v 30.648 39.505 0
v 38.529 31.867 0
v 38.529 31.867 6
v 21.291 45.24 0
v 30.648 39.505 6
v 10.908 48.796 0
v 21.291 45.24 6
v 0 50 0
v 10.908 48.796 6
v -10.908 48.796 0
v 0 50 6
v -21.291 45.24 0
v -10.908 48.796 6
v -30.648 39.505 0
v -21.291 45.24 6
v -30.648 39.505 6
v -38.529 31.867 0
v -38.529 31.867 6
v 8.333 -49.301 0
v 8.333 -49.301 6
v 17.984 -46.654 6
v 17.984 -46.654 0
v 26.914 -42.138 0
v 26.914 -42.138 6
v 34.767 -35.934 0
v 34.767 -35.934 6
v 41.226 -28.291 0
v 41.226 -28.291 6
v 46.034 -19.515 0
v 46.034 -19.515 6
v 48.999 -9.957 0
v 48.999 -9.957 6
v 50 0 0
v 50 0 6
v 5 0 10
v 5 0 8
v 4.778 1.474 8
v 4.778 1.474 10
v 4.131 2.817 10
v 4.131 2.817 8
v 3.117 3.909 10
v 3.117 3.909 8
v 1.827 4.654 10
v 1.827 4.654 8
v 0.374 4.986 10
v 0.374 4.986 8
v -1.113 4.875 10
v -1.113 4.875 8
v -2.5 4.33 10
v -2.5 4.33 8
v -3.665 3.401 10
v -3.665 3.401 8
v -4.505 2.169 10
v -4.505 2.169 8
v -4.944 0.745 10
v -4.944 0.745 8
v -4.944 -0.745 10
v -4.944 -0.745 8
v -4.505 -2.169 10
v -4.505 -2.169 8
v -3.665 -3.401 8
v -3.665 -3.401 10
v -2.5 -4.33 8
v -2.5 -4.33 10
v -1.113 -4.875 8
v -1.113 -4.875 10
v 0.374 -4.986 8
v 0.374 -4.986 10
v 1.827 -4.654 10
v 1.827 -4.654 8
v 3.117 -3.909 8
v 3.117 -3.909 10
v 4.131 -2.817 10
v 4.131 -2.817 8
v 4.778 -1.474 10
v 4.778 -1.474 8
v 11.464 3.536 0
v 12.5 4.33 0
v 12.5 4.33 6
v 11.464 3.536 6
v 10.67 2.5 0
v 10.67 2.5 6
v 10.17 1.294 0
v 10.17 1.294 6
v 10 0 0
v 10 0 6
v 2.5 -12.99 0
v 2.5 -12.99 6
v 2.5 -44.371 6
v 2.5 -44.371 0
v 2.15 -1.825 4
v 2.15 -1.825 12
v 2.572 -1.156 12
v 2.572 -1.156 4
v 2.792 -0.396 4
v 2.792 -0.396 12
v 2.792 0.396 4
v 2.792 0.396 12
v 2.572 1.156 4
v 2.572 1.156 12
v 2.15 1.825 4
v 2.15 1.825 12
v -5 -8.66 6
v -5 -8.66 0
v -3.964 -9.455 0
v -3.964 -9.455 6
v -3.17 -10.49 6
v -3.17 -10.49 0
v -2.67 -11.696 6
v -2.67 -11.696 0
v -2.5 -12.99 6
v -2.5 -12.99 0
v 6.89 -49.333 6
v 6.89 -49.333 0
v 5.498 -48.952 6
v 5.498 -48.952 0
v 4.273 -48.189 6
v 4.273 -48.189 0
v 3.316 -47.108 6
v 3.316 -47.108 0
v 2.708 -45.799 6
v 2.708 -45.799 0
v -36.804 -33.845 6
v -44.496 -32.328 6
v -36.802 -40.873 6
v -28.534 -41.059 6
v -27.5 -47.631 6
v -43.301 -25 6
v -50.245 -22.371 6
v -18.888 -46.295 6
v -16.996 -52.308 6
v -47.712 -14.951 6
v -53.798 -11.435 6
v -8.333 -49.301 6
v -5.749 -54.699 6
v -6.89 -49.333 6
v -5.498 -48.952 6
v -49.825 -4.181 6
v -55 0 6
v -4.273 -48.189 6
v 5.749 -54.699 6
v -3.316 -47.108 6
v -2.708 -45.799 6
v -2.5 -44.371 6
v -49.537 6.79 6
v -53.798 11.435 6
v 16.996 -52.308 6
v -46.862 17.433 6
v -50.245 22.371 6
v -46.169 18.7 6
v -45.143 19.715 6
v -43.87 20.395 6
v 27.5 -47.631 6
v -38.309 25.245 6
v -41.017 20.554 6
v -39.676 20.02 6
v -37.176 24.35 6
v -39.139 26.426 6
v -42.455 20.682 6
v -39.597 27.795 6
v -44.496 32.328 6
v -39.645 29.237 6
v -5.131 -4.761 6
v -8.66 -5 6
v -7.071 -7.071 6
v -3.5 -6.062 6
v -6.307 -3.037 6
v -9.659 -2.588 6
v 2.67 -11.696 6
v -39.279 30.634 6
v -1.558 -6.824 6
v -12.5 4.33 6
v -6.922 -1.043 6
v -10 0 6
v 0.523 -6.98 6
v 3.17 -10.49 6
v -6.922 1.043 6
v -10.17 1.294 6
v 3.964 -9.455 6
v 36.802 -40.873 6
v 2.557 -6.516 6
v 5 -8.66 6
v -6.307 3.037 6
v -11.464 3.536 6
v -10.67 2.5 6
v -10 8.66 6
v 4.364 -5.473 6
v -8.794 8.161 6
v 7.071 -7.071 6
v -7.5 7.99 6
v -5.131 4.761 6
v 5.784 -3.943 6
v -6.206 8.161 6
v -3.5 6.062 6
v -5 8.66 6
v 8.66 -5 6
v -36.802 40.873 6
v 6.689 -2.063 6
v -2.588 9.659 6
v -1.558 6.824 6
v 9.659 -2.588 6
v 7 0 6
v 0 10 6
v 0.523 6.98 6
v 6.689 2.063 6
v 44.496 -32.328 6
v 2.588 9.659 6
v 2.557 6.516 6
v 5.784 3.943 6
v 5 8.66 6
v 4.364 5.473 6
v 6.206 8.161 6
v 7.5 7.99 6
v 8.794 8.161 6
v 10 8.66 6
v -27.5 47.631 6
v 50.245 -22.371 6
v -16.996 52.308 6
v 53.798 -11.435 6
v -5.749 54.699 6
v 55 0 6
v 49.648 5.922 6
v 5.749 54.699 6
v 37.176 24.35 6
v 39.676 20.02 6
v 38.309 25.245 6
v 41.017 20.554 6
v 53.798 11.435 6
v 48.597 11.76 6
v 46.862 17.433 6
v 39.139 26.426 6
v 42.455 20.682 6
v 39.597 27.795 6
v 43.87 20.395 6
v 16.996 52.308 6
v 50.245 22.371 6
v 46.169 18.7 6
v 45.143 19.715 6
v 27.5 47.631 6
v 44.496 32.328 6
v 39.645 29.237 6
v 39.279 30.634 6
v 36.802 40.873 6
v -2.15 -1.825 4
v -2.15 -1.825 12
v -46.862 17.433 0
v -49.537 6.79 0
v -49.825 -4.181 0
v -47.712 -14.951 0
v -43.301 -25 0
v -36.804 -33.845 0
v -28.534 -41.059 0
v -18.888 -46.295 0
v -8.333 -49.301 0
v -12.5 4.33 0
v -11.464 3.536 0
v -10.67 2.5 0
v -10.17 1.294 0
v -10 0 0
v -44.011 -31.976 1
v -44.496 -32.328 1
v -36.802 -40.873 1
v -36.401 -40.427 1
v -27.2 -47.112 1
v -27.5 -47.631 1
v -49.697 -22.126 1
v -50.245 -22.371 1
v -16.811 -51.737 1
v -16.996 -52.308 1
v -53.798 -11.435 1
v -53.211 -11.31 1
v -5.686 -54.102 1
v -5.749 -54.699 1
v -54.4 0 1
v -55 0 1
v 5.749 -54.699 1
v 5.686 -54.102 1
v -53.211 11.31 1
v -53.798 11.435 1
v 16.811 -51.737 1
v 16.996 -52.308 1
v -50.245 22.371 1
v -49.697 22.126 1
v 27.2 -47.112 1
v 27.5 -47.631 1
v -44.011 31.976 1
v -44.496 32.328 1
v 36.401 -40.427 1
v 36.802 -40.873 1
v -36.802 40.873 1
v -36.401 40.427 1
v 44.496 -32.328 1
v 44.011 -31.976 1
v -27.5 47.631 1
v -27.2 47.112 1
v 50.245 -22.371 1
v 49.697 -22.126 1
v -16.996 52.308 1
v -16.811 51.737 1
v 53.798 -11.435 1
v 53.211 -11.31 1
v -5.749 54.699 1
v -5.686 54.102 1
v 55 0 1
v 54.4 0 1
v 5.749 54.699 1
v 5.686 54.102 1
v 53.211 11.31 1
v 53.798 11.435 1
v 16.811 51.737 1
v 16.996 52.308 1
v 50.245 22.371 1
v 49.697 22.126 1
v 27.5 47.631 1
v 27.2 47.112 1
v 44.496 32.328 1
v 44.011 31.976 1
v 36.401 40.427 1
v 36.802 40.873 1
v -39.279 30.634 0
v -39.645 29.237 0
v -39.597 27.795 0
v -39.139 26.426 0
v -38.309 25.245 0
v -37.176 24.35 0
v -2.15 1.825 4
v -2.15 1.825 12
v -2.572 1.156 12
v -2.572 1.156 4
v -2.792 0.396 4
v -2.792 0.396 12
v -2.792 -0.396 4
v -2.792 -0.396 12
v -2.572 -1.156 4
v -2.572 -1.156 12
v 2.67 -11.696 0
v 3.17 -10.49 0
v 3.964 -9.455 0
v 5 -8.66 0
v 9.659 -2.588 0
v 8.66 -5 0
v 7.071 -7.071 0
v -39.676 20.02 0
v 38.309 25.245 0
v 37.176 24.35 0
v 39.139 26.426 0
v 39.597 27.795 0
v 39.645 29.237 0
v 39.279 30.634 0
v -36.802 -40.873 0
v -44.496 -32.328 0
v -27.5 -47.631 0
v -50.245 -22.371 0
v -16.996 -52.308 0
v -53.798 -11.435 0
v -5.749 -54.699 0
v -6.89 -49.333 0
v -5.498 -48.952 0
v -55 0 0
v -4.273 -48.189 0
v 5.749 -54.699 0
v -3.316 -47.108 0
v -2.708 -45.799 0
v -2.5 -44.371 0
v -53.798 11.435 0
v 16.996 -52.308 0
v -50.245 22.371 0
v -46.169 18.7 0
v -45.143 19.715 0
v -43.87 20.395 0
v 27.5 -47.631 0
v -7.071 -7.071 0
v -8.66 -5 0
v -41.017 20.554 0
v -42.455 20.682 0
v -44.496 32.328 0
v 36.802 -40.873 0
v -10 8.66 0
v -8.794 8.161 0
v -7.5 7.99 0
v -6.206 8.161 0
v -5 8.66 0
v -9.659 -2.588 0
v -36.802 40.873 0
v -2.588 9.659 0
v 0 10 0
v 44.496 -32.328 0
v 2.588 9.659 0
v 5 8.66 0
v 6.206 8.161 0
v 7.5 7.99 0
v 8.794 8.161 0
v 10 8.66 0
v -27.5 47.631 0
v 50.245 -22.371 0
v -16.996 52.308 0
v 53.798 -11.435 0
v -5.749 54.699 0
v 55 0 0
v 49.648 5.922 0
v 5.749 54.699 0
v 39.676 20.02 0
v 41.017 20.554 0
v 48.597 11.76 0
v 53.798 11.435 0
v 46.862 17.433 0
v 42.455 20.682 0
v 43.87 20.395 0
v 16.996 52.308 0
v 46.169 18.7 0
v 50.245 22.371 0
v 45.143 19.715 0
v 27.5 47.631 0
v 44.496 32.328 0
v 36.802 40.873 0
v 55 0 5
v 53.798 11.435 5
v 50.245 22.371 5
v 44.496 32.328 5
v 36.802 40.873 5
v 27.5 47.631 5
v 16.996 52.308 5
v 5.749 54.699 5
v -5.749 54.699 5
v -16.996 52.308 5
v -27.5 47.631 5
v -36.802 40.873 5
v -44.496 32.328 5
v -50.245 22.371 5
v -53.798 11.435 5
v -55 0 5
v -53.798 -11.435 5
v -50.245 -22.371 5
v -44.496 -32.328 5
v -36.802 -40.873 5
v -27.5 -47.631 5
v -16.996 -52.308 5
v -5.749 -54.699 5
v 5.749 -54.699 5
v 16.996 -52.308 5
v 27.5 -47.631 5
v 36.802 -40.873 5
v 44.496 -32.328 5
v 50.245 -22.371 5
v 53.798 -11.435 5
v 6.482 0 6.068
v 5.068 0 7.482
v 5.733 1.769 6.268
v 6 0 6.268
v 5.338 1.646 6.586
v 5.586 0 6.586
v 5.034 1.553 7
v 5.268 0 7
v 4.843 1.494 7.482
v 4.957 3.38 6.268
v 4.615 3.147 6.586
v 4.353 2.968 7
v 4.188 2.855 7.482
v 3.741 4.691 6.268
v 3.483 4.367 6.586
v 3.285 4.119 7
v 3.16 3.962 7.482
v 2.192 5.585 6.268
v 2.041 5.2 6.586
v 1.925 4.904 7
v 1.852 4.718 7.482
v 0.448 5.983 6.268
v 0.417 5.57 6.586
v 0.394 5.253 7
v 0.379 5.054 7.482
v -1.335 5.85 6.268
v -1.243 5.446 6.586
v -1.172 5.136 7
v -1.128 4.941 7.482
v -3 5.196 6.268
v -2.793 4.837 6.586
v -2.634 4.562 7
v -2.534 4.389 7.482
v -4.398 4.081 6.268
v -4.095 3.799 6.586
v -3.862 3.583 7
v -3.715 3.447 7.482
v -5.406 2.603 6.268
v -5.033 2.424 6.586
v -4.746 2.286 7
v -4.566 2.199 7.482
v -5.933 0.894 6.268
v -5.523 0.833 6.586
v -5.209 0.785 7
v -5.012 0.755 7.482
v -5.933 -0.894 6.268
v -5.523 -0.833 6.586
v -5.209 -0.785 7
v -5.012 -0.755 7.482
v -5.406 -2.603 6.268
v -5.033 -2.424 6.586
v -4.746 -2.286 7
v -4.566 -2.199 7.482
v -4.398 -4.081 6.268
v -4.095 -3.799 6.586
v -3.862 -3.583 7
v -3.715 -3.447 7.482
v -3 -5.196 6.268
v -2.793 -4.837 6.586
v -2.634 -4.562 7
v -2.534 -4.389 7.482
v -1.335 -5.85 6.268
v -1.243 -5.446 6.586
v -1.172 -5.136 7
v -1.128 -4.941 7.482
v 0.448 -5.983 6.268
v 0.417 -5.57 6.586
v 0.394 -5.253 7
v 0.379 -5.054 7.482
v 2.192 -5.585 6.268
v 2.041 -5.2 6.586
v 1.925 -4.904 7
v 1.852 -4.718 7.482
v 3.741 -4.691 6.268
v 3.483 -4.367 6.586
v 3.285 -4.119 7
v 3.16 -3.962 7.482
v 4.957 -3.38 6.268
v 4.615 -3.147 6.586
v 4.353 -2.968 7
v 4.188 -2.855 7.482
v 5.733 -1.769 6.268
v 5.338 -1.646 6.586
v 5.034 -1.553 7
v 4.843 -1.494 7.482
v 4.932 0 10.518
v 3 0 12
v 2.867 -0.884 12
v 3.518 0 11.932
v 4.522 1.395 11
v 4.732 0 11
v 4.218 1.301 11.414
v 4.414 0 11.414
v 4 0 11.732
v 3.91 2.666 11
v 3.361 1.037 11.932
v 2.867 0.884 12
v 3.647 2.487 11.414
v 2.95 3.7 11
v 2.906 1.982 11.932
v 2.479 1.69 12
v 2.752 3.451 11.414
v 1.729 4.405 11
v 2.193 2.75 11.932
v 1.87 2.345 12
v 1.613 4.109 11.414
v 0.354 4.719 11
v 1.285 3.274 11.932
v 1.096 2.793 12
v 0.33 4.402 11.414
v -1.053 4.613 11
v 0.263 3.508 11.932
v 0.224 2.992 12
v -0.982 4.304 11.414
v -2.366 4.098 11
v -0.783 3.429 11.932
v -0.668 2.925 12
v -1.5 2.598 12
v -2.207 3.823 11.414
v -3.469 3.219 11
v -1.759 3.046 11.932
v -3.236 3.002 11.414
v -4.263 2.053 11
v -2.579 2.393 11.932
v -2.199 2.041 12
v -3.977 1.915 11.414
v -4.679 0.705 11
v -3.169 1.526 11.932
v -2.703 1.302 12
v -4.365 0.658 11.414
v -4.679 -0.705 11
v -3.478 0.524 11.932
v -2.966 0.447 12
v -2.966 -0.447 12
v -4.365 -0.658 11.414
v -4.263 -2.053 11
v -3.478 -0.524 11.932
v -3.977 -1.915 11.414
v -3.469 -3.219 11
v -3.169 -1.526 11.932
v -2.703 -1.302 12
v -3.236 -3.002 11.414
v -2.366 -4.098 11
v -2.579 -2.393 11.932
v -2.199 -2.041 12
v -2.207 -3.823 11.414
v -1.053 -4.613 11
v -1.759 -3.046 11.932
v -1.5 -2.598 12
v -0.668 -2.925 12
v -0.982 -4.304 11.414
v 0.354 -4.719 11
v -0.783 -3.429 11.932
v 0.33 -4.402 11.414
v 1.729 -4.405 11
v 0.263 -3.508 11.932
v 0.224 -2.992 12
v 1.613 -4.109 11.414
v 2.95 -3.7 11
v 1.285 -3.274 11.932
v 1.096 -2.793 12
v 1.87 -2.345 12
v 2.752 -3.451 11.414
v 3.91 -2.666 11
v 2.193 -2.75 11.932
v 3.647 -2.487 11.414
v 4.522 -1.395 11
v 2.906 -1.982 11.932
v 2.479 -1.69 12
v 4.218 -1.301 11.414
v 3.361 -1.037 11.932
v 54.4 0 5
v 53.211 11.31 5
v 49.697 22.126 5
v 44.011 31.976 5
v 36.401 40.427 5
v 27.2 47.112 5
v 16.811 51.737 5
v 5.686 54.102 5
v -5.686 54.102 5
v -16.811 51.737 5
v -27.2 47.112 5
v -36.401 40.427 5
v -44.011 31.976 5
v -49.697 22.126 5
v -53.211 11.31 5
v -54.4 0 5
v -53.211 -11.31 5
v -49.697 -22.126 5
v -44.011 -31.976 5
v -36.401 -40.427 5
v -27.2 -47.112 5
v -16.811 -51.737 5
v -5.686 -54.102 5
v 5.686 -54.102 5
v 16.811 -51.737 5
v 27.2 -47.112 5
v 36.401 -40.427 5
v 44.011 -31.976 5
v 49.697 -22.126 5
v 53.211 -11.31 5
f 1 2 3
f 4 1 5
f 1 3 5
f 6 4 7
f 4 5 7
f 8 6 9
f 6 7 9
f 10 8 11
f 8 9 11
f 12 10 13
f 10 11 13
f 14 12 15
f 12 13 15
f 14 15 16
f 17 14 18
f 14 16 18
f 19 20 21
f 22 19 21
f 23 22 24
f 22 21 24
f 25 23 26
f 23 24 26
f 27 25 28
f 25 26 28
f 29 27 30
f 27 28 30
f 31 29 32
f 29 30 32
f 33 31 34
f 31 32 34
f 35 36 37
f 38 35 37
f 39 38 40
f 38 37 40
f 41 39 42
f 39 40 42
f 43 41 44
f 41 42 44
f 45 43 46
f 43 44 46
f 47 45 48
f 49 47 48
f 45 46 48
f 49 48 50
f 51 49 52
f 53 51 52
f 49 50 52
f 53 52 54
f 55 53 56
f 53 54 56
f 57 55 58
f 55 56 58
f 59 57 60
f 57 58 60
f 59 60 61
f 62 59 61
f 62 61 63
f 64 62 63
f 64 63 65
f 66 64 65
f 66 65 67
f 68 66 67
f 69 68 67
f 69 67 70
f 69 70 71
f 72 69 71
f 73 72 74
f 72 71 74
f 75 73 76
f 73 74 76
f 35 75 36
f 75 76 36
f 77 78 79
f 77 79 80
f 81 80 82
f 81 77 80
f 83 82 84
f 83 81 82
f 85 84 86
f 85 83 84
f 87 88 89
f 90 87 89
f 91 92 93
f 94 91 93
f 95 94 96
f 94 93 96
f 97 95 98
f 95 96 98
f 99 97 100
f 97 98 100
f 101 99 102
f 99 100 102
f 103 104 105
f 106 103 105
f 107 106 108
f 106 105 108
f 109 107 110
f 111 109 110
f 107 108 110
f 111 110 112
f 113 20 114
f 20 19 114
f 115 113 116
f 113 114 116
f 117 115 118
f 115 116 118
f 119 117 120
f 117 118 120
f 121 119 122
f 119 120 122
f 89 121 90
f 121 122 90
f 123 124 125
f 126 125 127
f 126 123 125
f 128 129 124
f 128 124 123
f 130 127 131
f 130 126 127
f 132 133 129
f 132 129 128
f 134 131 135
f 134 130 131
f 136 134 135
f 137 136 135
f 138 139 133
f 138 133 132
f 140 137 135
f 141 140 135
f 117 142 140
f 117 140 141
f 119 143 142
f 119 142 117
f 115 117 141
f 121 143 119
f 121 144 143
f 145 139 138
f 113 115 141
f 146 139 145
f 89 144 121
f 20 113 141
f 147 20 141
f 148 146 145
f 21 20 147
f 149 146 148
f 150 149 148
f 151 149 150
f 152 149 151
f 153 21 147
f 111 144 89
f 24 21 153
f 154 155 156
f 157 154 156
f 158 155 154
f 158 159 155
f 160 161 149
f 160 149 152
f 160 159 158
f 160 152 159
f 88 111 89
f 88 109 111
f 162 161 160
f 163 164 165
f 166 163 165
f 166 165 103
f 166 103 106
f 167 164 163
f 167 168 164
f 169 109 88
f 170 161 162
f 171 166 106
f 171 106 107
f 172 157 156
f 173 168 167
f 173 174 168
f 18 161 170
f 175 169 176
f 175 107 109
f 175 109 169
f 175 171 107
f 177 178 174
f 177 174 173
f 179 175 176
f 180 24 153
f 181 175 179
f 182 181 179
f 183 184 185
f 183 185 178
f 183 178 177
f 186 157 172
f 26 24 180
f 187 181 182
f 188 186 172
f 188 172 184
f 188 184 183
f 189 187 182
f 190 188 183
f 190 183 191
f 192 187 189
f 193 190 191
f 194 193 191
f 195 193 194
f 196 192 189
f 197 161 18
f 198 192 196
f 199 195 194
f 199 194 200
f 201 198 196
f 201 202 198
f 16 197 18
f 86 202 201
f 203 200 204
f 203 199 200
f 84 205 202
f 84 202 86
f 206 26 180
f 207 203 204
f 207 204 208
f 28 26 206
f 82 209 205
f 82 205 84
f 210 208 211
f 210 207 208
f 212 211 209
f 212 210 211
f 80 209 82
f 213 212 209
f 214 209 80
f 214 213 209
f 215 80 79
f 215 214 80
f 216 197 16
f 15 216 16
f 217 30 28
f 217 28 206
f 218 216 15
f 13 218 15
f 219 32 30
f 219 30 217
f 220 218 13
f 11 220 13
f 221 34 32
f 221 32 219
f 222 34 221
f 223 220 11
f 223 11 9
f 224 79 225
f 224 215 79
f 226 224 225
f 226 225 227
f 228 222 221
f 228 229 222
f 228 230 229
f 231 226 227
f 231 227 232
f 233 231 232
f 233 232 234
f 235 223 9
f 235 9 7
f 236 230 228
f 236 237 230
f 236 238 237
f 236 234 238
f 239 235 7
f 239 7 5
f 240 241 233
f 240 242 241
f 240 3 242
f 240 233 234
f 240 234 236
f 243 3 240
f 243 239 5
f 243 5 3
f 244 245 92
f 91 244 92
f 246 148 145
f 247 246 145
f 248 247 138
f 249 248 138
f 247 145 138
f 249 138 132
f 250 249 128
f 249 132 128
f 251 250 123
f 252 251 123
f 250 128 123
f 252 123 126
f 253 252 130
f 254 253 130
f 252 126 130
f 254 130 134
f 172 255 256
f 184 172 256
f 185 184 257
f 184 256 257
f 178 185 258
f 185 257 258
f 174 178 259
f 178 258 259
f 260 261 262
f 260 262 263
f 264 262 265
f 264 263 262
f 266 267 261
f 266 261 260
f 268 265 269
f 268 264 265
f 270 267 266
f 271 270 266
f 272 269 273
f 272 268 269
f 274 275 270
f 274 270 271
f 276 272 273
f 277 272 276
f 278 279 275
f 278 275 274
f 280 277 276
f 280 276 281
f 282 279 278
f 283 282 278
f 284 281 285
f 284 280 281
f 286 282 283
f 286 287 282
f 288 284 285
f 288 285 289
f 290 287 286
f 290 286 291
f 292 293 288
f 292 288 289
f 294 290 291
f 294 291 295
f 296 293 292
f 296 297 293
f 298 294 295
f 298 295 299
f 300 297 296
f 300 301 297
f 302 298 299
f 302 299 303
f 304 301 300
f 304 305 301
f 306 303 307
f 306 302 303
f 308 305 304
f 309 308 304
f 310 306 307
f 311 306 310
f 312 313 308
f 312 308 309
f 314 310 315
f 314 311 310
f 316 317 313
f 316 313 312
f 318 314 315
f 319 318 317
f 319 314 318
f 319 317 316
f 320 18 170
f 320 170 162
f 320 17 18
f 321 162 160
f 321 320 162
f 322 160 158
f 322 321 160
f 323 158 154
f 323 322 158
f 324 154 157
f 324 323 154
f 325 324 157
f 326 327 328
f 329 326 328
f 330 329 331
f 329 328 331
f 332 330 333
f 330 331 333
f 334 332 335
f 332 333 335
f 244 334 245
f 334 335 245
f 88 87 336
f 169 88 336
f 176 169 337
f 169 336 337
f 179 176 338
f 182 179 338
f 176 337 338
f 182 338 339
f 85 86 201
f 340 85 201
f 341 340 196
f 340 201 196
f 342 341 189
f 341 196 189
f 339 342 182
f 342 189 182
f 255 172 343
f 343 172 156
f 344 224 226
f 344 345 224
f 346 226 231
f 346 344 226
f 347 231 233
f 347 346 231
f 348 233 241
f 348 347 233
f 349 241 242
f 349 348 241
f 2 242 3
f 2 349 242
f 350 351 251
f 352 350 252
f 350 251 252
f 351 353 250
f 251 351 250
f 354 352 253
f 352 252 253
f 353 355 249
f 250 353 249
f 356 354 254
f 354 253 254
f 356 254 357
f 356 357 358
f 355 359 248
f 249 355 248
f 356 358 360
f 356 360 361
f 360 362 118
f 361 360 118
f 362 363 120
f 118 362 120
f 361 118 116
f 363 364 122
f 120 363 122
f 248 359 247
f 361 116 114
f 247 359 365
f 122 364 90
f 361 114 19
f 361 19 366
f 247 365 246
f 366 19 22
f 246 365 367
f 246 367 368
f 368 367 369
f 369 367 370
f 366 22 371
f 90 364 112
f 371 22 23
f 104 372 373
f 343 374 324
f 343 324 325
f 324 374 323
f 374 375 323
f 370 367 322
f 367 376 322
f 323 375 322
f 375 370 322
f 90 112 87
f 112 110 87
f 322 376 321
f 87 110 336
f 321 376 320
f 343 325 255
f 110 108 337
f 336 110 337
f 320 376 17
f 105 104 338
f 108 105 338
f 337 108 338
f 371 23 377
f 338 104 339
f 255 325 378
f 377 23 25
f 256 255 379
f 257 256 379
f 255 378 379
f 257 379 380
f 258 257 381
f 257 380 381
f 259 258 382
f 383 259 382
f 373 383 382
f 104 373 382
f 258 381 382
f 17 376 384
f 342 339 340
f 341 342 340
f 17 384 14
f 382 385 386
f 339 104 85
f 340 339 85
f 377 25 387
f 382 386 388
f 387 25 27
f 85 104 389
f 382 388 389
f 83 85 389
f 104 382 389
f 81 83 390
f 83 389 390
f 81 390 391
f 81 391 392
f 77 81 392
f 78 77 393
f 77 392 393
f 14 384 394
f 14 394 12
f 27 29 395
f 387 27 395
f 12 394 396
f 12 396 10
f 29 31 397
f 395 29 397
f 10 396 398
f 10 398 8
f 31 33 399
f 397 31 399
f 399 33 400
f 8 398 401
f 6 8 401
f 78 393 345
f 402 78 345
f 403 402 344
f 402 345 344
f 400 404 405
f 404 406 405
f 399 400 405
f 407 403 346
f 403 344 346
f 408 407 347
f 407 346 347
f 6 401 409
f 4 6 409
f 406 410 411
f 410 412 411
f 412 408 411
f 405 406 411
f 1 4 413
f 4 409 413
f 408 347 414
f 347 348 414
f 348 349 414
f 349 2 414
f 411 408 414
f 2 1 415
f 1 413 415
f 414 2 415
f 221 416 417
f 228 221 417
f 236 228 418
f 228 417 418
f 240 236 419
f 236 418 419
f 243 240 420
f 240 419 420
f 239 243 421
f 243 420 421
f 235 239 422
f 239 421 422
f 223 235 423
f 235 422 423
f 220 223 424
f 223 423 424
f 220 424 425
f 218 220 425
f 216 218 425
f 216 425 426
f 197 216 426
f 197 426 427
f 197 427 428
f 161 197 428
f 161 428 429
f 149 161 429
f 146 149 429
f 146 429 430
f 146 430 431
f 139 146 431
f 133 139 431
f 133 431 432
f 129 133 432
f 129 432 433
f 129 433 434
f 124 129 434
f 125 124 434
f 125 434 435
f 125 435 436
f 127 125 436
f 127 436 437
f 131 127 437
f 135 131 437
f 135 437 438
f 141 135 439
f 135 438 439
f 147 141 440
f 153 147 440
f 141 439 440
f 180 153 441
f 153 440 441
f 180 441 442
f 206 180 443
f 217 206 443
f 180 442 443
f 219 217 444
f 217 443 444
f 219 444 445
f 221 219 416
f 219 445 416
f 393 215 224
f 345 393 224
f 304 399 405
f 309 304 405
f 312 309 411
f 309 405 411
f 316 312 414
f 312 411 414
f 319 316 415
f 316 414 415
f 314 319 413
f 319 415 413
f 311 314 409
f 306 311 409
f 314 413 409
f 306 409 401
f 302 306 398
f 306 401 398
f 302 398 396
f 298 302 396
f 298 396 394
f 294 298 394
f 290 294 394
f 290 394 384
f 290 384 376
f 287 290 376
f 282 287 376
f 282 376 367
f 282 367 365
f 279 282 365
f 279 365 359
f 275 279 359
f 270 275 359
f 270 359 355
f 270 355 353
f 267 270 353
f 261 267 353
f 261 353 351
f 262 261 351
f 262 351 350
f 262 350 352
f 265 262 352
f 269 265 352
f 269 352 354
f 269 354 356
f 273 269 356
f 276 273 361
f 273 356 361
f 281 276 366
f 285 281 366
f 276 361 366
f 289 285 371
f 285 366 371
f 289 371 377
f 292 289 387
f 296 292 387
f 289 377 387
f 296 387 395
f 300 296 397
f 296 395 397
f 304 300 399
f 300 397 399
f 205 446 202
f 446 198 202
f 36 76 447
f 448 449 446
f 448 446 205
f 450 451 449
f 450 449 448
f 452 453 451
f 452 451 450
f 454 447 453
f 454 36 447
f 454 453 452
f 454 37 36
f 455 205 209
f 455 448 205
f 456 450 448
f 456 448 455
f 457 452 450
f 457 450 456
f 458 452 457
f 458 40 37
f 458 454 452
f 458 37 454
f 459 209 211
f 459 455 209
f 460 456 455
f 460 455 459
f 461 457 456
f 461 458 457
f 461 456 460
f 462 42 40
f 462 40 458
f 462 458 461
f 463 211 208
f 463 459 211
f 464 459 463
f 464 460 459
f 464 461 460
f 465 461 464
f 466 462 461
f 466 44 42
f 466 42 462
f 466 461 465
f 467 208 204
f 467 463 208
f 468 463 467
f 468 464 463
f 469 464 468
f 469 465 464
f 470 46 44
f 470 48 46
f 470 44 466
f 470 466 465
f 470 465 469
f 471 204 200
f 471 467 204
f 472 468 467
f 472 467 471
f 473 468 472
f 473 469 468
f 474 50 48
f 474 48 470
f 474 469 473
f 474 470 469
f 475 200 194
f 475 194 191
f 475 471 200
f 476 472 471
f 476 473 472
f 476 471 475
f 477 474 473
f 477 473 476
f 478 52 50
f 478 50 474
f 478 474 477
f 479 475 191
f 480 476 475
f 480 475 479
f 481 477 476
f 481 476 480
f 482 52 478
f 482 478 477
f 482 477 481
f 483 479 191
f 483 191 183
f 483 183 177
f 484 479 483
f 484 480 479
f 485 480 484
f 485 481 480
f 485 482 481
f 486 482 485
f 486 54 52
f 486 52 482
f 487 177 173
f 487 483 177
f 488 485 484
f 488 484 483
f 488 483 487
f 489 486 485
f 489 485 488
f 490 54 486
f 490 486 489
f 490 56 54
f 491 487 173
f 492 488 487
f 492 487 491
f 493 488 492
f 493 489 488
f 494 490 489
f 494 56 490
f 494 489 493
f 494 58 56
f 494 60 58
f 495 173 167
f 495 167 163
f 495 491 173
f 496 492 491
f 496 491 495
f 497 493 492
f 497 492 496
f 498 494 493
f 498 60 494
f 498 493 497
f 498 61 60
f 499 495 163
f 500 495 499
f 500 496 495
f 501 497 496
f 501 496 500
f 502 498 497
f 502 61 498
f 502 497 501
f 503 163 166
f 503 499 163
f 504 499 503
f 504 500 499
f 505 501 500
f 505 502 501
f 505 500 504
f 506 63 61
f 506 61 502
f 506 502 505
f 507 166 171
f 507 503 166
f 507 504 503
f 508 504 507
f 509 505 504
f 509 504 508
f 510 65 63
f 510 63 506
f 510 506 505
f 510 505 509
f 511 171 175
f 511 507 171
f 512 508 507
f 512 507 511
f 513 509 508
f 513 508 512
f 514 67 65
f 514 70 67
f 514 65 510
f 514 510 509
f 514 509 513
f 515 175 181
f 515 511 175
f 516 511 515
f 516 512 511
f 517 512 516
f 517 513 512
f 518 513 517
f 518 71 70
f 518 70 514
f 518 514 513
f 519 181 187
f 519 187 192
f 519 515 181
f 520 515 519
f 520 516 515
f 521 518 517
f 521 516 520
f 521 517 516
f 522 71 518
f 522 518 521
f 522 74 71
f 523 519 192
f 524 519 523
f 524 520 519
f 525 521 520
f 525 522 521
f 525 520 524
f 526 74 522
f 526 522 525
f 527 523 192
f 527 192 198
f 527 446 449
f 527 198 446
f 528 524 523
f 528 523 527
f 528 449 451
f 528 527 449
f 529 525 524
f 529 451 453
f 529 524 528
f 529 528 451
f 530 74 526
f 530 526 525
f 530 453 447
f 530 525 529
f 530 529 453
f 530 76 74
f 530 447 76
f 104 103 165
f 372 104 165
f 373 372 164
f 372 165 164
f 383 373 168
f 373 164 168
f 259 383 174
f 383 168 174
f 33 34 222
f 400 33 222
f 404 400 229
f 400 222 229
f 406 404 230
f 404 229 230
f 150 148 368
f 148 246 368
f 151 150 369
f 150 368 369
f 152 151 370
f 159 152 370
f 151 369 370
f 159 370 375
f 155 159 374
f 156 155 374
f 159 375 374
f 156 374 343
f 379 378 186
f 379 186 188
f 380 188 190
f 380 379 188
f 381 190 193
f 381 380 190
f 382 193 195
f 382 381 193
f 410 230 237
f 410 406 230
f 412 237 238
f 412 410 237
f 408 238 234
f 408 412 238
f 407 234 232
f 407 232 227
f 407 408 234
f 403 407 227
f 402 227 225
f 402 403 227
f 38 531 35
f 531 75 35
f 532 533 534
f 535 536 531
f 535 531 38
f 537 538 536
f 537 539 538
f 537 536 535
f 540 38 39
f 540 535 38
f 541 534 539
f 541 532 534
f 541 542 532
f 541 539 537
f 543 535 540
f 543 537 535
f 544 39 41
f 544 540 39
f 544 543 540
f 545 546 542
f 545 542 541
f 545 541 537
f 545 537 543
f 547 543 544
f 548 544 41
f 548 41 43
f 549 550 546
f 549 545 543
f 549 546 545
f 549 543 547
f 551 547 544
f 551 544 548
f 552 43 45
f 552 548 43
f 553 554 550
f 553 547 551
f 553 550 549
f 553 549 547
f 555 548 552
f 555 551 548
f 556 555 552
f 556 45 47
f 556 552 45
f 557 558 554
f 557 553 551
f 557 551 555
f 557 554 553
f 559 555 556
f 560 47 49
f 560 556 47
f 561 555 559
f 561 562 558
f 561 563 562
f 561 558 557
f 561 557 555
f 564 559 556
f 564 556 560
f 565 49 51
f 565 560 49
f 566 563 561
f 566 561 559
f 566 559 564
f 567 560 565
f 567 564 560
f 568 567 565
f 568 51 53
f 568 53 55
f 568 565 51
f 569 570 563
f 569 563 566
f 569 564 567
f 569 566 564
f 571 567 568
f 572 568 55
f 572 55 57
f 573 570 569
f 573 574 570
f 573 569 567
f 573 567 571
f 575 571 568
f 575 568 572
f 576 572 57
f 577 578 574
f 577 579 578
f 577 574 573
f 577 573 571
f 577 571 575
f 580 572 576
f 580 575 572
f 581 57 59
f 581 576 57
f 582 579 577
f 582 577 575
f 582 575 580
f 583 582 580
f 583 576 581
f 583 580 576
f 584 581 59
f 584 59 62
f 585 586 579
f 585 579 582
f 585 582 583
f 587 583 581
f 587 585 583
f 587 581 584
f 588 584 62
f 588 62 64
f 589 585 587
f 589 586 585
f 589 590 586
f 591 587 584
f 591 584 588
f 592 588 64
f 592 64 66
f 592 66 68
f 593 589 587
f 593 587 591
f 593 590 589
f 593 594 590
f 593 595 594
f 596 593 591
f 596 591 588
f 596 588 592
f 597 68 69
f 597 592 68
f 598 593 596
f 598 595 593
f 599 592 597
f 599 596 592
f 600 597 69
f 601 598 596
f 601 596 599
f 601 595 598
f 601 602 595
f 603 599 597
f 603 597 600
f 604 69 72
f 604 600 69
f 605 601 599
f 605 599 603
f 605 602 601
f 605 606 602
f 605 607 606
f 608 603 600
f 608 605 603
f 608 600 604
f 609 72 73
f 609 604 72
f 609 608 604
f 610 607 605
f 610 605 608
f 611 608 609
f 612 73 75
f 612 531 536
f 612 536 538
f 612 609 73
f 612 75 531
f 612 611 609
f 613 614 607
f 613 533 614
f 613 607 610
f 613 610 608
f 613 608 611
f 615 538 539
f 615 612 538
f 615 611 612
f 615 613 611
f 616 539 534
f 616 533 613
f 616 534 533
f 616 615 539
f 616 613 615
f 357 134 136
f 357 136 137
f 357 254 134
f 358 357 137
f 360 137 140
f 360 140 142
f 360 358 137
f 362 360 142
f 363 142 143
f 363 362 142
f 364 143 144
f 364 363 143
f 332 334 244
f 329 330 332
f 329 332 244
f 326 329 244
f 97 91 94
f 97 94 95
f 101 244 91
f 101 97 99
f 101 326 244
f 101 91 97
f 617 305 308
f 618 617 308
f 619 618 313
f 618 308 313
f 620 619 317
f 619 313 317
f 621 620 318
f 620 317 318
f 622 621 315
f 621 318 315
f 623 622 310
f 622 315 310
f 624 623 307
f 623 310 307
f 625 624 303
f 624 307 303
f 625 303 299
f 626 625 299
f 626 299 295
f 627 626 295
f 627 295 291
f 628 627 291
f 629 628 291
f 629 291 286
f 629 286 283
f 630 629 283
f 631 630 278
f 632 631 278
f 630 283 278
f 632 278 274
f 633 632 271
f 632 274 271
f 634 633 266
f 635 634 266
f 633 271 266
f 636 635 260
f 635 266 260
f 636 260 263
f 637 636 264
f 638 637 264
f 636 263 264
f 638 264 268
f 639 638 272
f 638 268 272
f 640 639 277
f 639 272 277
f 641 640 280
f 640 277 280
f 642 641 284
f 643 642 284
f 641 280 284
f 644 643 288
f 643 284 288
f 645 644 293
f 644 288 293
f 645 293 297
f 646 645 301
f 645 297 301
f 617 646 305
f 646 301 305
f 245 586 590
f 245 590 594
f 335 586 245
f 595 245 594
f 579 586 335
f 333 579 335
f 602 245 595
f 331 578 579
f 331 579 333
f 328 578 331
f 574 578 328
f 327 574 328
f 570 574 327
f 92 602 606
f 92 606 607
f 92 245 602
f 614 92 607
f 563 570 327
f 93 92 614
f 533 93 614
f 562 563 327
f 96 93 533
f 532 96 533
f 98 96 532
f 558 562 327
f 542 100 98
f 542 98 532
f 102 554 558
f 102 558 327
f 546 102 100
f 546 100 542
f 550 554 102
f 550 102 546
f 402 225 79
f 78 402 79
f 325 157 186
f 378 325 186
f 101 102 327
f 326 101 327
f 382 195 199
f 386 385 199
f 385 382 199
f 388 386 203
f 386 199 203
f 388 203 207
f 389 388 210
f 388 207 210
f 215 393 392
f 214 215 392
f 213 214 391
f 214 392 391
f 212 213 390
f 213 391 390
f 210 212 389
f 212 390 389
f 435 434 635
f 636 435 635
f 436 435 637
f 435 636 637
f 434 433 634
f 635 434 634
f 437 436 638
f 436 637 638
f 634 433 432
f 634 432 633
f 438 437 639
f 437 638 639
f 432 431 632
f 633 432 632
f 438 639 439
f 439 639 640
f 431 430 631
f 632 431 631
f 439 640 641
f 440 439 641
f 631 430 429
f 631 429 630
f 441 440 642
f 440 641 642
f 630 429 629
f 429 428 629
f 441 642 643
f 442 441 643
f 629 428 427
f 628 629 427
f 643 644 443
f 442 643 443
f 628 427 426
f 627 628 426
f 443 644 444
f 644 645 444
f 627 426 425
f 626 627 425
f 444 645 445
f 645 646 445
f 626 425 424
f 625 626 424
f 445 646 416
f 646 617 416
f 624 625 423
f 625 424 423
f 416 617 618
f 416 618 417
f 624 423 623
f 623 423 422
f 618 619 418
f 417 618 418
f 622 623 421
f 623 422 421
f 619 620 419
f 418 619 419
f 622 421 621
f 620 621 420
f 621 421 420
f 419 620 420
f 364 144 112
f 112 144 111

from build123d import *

# Parameters (mm, degrees)
F0_R         = 55
F1_DEPTH     = 6
F2_R         = 5
F3_DEPTH     = 6
F5_DEPTH     = 8
F7_R         = 55
F7_R_2       = 54.4
F8_DEPTH     = 4
F10_DEPTH    = 25
F11_R        = 5
F12_T1_DEPTH = 6
F13_R        = 2


# Not quite as in the source:
# - a fillet or chamfer that OpenCascade refuses, or shapes differently, is made with other operations: its cross-section is extruded or revolved along the edge and cut away or added


with BuildPart() as f1:
    # F0 (on Top) → F1 (new body)
    with BuildSketch(Plane.XY):
        Circle(F0_R)
    extrude(amount=F1_DEPTH)

    # F2 (on face) → F3 (join)
    with BuildSketch(Plane.XY.offset(6)):
        Circle(F2_R)
    extrude(amount=F3_DEPTH)

    # F4 (on face) → F5 (cut)
    with BuildSketch(Plane.XY.offset(12)):
        with BuildLine():
            Line((2.1498313887, 1.825), (-2.1498313887, 1.825))
            ThreePointArc((-2.1498313887, 1.825), (-2.82, 0), (-2.1498313887, -1.825))
            Line((-2.1498313887, -1.825), (2.1498313887, -1.825))
            ThreePointArc((2.1498313887, -1.825), (2.82, 0), (2.1498313887, 1.825))
        make_face()
    extrude(amount=-F5_DEPTH, mode=Mode.SUBTRACT)

    # F7 (on offset) → F8 (cut)
    with BuildSketch(Plane.XY.offset(1)):
        Circle(F7_R)
        Circle(F7_R_2, mode=Mode.SUBTRACT)
    extrude(amount=F8_DEPTH, mode=Mode.SUBTRACT)

    # F9 (on face) → F10 (cut)
    with BuildSketch(Plane.XY.offset(6)):
        with BuildLine():
            Line((7.1352549156, 7.0062926922), (41.9971112805, 27.1337948489))
            ThreePointArc((41.9971112805, 27.1337948489), (0, 50.0000017881), (-41.9971112805, 27.1337948489))
            Line((-41.9971112805, 27.1337948489), (-7.1352549156, 7.0062926922))
            ThreePointArc((-7.1352549156, 7.0062926922), (0, 10), (7.1352549156, 7.0062926922))
        make_face()
        with BuildLine():
            ThreePointArc((2.5, -49.937462679), (36.2284431303, -34.460123145), (50.0000017881, 0))
            ThreePointArc((50.0000017881, 0), (48.6048136629, 11.729120496), (44.4971112805, 22.80366783))
            Line((44.4971112805, 22.80366783), (9.6352549156, 2.6761656733))
            ThreePointArc((9.6352549156, 2.6761656733), (9.9083941473, 1.3504537837), (10, 0))
            ThreePointArc((10, 0), (7.9056941504, -6.123724357), (2.5, -9.6824583655))
            Line((2.5, -9.6824583655), (2.5, -49.937462679))
        make_face()
        with BuildLine():
            ThreePointArc((-44.4971112805, 22.80366783), (-43.3012717378, -25.0000008941), (-2.5, -49.937462679))
            Line((-2.5, -49.937462679), (-2.5, -9.6824583655))
            ThreePointArc((-2.5, -9.6824583655), (-8.6602540378, -5), (-9.6352549156, 2.6761656733))
            Line((-9.6352549156, 2.6761656733), (-44.4971112805, 22.80366783))
        make_face()
    extrude(amount=-F10_DEPTH, mode=Mode.SUBTRACT)

    # F11
    f11_edges = [f1.edges().sort_by_distance(p)[0] for p in [
        (-44.497111, 22.803668, 3),
        (-41.997111, 27.133795, 3),
        (41.997111, 27.133795, 3),
        (44.497111, 22.803668, 3),
        (2.5, -49.937463, 3),
        (-2.5, -49.937463, 3),
    ]]
    fillet(f11_edges, radius=F11_R)

    # F12: fillet of radius 5 on 6 edges, made by hand

    # F12_s2 → F12_t1 (join)
    with BuildSketch(Plane.XY):
        with BuildLine():
            ThreePointArc((-12.5, 4.3301270189), (-10.6698729811, 2.5), (-10, 0))
            ThreePointArc((-10, 0), (-9.9083941473, 1.3504537837), (-9.6352549156, 2.6761656733))
            Line((-9.6352549156, 2.6761656733), (-12.5, 4.3301270189))
        make_face()
        with BuildLine():
            ThreePointArc((-5, -8.6602540378), (-3.1698729811, -10.4903810568), (-2.5, -12.9903810568))
            Line((-2.5, -12.9903810568), (-2.5, -9.6824583655))
            ThreePointArc((-2.5, -9.6824583655), (-3.7846697903, -9.2561479341), (-5, -8.6602540378))
        make_face()
        with BuildLine():
            ThreePointArc((2.5, -12.9903810568), (3.1698729811, -10.4903810568), (5, -8.6602540378))
            ThreePointArc((5, -8.6602540378), (3.7846697903, -9.2561479341), (2.5, -9.6824583655))
            Line((2.5, -9.6824583655), (2.5, -12.9903810568))
        make_face()
        with BuildLine():
            ThreePointArc((12.5, 4.3301270189), (10.6698729811, 2.5), (10, 0))
            ThreePointArc((10, 0), (9.9083941473, 1.3504537837), (9.6352549156, 2.6761656733))
            Line((9.6352549156, 2.6761656733), (12.5, 4.3301270189))
        make_face()
        with BuildLine():
            ThreePointArc((10, 8.6602540378), (7.5, 7.9903810568), (5, 8.6602540378))
            ThreePointArc((5, 8.6602540378), (6.123724357, 7.9056941504), (7.1352549156, 7.0062926922))
            Line((7.1352549156, 7.0062926922), (10, 8.6602540378))
        make_face()
        with BuildLine():
            ThreePointArc((-10, 8.6602540378), (-7.5, 7.9903810568), (-5, 8.6602540378))
            ThreePointArc((-5, 8.6602540378), (-6.123724357, 7.9056941504), (-7.1352549156, 7.0062926922))
            Line((-7.1352549156, 7.0062926922), (-10, 8.6602540378))
        make_face()
    extrude(amount=F12_T1_DEPTH)

    # F13
    f13_edges = [f1.edges().sort_by_distance(p)[0] for p in [
        (-5, 0, 6),
        (-5, 0, 12),
    ]]
    fillet(f13_edges, radius=F13_R)


solid = f1.part
